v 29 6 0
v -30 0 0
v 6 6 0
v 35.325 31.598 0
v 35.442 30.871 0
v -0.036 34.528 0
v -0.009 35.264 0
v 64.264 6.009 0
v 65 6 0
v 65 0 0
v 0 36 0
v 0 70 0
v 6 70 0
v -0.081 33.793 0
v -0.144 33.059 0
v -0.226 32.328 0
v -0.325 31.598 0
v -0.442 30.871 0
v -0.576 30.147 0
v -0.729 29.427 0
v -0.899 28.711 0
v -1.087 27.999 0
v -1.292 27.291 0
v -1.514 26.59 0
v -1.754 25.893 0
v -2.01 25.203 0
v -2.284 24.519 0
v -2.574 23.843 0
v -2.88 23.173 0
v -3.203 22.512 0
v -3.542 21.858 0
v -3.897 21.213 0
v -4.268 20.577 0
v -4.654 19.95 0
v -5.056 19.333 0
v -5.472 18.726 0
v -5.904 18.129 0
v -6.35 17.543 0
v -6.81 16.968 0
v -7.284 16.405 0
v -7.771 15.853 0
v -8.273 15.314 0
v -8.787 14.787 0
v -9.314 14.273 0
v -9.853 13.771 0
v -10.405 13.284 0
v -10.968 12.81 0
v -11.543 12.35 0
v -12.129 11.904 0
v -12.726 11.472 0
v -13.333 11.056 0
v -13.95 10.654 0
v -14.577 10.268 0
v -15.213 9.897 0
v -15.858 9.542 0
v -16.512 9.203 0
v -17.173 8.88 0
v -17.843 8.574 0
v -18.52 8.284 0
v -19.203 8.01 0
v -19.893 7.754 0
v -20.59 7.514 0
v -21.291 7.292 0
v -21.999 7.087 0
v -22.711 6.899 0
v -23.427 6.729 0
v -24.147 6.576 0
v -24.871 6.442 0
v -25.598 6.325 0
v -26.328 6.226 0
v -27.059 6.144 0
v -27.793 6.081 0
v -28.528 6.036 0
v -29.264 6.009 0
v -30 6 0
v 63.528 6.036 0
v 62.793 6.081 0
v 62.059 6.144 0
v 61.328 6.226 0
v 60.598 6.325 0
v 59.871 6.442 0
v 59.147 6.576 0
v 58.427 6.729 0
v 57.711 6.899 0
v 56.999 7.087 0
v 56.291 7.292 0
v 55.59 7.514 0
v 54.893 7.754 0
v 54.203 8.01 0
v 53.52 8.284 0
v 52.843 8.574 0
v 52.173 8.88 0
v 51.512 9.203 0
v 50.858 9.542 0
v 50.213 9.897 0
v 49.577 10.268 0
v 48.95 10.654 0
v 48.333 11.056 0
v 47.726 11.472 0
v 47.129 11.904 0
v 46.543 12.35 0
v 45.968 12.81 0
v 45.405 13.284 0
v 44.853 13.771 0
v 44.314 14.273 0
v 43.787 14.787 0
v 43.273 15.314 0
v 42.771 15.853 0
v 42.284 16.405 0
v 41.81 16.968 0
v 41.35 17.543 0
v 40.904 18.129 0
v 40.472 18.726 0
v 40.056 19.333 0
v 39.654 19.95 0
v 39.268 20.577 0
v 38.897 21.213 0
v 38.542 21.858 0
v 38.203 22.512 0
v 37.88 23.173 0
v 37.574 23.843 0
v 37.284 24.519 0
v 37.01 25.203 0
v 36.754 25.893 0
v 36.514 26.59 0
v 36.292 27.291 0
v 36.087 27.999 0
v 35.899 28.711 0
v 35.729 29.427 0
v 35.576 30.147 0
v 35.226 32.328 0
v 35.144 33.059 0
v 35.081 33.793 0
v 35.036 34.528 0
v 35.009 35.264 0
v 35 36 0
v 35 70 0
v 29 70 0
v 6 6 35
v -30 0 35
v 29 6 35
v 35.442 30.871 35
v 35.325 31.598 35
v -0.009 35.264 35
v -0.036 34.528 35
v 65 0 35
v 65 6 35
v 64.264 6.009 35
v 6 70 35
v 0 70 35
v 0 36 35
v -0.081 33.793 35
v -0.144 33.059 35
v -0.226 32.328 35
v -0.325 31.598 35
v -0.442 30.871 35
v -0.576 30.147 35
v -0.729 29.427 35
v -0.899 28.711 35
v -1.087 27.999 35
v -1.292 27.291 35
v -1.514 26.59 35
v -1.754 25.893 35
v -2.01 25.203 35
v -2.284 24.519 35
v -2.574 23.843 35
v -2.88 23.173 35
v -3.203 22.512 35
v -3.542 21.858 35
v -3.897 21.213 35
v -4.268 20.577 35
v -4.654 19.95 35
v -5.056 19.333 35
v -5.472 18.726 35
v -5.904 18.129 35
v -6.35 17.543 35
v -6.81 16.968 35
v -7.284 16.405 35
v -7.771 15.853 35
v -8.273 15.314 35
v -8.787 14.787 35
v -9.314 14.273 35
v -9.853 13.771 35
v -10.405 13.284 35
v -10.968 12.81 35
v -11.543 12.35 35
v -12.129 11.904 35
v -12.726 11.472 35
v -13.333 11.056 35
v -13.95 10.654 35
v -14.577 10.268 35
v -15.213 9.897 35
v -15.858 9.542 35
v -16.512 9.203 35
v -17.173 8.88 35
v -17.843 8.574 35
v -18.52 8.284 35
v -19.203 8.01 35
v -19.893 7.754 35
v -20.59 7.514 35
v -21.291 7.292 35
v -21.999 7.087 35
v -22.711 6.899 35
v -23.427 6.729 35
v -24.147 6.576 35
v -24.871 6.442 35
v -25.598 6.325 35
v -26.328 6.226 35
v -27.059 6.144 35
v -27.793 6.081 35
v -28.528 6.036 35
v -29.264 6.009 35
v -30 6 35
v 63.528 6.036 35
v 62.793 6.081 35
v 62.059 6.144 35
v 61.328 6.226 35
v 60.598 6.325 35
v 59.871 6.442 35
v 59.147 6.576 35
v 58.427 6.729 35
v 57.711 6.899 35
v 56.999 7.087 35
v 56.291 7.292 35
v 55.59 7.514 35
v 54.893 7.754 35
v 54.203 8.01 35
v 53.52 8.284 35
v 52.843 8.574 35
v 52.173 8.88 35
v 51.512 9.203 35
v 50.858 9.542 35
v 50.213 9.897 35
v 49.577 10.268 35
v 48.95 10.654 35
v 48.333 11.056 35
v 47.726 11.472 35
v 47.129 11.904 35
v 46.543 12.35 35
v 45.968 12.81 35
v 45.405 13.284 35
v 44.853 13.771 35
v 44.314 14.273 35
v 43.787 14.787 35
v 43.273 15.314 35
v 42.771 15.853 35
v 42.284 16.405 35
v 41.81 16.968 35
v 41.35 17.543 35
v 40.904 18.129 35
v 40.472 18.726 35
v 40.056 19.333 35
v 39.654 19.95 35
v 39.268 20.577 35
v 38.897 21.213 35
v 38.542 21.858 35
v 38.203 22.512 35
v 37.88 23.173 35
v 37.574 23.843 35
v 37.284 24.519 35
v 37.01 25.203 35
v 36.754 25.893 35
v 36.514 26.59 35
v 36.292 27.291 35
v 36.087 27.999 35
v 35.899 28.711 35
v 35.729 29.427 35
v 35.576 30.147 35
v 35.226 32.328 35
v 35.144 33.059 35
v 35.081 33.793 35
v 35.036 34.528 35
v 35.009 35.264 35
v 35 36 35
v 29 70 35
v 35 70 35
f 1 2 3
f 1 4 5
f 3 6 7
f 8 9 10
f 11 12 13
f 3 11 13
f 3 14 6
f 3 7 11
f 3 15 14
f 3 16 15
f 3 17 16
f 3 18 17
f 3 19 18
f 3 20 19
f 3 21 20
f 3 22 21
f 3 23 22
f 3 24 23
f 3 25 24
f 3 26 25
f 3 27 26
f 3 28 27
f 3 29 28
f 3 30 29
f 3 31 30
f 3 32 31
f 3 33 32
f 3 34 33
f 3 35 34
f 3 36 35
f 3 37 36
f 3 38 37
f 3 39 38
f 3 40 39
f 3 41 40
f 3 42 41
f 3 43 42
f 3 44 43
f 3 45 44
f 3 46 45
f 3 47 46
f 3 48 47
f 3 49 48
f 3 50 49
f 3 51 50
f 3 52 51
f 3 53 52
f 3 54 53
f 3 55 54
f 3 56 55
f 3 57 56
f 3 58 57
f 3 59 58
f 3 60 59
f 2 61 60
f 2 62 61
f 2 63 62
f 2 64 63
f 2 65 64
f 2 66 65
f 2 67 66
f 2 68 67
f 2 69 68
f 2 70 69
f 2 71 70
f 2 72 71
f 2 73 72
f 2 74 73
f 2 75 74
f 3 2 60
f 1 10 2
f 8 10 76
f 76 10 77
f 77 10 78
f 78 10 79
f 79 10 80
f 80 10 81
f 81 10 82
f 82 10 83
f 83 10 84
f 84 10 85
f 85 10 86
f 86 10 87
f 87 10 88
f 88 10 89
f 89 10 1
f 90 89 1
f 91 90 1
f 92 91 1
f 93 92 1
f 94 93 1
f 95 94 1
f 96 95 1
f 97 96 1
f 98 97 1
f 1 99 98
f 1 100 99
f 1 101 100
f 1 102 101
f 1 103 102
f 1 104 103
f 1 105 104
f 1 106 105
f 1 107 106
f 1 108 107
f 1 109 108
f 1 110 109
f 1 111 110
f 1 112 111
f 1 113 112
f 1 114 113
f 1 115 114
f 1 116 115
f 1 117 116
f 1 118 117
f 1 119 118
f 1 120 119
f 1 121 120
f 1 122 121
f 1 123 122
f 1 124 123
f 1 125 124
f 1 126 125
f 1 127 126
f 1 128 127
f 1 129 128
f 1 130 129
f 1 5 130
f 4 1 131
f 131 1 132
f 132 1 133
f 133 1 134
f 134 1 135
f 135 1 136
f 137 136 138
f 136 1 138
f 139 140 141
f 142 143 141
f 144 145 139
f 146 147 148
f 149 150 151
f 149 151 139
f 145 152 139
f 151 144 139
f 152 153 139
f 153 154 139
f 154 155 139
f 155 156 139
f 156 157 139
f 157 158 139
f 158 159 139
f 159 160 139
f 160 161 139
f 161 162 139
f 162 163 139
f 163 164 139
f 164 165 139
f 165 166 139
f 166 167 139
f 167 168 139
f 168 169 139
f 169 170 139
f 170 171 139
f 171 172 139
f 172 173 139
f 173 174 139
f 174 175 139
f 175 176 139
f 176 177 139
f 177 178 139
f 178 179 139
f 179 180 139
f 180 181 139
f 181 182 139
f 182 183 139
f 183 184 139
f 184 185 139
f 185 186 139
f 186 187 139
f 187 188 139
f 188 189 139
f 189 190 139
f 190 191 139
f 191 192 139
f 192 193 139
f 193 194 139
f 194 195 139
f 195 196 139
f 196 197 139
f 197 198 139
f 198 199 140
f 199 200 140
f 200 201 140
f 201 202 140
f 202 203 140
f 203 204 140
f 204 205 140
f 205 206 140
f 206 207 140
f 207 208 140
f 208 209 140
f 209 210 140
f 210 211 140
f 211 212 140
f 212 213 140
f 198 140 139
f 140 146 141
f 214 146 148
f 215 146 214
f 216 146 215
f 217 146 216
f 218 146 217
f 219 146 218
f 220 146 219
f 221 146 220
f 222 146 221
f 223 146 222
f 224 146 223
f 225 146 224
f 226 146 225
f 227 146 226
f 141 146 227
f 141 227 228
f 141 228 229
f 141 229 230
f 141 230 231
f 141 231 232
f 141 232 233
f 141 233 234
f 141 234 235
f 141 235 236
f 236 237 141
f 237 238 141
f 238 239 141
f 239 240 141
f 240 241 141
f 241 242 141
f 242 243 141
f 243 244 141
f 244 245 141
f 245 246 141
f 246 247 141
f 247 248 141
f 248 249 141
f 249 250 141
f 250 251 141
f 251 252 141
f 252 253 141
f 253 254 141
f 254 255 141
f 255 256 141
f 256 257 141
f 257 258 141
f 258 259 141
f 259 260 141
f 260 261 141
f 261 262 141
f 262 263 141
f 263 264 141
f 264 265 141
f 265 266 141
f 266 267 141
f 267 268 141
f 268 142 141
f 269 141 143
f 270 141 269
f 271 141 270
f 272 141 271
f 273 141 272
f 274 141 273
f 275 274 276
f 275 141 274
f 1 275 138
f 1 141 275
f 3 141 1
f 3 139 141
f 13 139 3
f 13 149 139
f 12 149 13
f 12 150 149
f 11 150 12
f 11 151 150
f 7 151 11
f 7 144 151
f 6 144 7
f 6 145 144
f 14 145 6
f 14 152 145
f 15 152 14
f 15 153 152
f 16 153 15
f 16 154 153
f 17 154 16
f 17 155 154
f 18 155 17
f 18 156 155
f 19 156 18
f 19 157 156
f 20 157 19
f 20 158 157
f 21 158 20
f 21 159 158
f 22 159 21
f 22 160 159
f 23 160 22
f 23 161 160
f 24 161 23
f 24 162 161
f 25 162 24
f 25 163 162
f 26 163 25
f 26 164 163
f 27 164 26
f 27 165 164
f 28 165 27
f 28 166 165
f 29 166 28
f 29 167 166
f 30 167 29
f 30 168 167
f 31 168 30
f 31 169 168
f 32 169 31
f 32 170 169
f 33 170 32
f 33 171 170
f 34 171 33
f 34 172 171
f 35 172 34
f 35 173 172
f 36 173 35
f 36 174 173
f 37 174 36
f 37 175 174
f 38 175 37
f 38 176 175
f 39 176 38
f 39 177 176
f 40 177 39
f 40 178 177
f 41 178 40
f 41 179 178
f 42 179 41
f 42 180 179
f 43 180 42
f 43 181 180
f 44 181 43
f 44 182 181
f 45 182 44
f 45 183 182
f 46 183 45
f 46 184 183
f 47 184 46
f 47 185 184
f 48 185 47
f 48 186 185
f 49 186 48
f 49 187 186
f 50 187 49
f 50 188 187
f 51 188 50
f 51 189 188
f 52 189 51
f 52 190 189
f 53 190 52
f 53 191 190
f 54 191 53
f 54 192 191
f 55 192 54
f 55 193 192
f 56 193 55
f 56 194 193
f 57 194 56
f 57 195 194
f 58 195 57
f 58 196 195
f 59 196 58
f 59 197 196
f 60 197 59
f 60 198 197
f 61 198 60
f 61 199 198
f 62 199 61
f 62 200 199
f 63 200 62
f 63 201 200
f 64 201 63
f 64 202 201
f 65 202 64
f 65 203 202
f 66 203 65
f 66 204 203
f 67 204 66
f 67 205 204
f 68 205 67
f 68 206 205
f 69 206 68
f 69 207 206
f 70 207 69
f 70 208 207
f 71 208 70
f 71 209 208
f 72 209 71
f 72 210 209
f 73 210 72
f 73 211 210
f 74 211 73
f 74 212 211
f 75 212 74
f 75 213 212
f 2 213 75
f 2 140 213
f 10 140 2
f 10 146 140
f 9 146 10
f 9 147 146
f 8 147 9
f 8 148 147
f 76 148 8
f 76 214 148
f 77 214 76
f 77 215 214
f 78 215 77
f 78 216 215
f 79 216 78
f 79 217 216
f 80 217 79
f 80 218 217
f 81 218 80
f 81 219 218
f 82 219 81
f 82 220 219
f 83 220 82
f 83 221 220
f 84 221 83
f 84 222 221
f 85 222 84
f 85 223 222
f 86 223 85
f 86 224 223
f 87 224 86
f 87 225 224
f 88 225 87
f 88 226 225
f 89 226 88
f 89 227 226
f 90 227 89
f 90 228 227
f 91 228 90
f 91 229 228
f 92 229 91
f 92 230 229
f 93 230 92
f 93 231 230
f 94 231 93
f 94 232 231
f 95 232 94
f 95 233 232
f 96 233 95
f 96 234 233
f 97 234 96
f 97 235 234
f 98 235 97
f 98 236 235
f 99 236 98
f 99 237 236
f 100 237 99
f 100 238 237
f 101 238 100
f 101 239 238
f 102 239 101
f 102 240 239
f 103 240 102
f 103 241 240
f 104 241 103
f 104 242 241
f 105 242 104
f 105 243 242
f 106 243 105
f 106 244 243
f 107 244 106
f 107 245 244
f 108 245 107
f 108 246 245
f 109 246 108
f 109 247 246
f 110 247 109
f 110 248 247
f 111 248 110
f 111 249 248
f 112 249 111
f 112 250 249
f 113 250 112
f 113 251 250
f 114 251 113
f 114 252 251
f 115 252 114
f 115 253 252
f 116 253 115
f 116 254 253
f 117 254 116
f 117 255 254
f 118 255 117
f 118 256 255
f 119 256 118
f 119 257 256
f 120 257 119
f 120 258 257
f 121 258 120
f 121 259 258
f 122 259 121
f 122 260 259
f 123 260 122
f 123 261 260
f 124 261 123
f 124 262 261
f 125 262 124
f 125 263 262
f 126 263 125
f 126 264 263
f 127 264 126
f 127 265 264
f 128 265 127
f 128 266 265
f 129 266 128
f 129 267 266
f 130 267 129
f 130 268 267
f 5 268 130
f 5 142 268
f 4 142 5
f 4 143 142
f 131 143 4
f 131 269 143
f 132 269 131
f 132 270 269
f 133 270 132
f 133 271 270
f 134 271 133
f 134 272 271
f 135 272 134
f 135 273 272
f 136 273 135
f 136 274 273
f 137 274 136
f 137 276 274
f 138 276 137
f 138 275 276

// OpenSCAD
// Standing help for an EdgeRouter X

height = 70;
depth = 35;
thickness = 6;

legWidth = 30;
routerThickness = 23;

module stand() {
    linear_extrude(depth) {
        square([thickness, height]);
        
        translate([thickness + routerThickness, 0])
        square([thickness, height]);
        
        translate([thickness, 0])
        square([routerThickness, thickness]);
        
        translate([-legWidth, 0])
        leg();
        
        translate([2* thickness + routerThickness +legWidth, 0])
        scale([-1, 1])
        leg();
    }
}

module leg() {
    square([legWidth, thickness]);
    difference() {
        translate([0, thickness])
        square([legWidth, legWidth]);
        
        translate([0, thickness + legWidth])
        circle(r = legWidth, $fn = 256);
    }
}

stand();
